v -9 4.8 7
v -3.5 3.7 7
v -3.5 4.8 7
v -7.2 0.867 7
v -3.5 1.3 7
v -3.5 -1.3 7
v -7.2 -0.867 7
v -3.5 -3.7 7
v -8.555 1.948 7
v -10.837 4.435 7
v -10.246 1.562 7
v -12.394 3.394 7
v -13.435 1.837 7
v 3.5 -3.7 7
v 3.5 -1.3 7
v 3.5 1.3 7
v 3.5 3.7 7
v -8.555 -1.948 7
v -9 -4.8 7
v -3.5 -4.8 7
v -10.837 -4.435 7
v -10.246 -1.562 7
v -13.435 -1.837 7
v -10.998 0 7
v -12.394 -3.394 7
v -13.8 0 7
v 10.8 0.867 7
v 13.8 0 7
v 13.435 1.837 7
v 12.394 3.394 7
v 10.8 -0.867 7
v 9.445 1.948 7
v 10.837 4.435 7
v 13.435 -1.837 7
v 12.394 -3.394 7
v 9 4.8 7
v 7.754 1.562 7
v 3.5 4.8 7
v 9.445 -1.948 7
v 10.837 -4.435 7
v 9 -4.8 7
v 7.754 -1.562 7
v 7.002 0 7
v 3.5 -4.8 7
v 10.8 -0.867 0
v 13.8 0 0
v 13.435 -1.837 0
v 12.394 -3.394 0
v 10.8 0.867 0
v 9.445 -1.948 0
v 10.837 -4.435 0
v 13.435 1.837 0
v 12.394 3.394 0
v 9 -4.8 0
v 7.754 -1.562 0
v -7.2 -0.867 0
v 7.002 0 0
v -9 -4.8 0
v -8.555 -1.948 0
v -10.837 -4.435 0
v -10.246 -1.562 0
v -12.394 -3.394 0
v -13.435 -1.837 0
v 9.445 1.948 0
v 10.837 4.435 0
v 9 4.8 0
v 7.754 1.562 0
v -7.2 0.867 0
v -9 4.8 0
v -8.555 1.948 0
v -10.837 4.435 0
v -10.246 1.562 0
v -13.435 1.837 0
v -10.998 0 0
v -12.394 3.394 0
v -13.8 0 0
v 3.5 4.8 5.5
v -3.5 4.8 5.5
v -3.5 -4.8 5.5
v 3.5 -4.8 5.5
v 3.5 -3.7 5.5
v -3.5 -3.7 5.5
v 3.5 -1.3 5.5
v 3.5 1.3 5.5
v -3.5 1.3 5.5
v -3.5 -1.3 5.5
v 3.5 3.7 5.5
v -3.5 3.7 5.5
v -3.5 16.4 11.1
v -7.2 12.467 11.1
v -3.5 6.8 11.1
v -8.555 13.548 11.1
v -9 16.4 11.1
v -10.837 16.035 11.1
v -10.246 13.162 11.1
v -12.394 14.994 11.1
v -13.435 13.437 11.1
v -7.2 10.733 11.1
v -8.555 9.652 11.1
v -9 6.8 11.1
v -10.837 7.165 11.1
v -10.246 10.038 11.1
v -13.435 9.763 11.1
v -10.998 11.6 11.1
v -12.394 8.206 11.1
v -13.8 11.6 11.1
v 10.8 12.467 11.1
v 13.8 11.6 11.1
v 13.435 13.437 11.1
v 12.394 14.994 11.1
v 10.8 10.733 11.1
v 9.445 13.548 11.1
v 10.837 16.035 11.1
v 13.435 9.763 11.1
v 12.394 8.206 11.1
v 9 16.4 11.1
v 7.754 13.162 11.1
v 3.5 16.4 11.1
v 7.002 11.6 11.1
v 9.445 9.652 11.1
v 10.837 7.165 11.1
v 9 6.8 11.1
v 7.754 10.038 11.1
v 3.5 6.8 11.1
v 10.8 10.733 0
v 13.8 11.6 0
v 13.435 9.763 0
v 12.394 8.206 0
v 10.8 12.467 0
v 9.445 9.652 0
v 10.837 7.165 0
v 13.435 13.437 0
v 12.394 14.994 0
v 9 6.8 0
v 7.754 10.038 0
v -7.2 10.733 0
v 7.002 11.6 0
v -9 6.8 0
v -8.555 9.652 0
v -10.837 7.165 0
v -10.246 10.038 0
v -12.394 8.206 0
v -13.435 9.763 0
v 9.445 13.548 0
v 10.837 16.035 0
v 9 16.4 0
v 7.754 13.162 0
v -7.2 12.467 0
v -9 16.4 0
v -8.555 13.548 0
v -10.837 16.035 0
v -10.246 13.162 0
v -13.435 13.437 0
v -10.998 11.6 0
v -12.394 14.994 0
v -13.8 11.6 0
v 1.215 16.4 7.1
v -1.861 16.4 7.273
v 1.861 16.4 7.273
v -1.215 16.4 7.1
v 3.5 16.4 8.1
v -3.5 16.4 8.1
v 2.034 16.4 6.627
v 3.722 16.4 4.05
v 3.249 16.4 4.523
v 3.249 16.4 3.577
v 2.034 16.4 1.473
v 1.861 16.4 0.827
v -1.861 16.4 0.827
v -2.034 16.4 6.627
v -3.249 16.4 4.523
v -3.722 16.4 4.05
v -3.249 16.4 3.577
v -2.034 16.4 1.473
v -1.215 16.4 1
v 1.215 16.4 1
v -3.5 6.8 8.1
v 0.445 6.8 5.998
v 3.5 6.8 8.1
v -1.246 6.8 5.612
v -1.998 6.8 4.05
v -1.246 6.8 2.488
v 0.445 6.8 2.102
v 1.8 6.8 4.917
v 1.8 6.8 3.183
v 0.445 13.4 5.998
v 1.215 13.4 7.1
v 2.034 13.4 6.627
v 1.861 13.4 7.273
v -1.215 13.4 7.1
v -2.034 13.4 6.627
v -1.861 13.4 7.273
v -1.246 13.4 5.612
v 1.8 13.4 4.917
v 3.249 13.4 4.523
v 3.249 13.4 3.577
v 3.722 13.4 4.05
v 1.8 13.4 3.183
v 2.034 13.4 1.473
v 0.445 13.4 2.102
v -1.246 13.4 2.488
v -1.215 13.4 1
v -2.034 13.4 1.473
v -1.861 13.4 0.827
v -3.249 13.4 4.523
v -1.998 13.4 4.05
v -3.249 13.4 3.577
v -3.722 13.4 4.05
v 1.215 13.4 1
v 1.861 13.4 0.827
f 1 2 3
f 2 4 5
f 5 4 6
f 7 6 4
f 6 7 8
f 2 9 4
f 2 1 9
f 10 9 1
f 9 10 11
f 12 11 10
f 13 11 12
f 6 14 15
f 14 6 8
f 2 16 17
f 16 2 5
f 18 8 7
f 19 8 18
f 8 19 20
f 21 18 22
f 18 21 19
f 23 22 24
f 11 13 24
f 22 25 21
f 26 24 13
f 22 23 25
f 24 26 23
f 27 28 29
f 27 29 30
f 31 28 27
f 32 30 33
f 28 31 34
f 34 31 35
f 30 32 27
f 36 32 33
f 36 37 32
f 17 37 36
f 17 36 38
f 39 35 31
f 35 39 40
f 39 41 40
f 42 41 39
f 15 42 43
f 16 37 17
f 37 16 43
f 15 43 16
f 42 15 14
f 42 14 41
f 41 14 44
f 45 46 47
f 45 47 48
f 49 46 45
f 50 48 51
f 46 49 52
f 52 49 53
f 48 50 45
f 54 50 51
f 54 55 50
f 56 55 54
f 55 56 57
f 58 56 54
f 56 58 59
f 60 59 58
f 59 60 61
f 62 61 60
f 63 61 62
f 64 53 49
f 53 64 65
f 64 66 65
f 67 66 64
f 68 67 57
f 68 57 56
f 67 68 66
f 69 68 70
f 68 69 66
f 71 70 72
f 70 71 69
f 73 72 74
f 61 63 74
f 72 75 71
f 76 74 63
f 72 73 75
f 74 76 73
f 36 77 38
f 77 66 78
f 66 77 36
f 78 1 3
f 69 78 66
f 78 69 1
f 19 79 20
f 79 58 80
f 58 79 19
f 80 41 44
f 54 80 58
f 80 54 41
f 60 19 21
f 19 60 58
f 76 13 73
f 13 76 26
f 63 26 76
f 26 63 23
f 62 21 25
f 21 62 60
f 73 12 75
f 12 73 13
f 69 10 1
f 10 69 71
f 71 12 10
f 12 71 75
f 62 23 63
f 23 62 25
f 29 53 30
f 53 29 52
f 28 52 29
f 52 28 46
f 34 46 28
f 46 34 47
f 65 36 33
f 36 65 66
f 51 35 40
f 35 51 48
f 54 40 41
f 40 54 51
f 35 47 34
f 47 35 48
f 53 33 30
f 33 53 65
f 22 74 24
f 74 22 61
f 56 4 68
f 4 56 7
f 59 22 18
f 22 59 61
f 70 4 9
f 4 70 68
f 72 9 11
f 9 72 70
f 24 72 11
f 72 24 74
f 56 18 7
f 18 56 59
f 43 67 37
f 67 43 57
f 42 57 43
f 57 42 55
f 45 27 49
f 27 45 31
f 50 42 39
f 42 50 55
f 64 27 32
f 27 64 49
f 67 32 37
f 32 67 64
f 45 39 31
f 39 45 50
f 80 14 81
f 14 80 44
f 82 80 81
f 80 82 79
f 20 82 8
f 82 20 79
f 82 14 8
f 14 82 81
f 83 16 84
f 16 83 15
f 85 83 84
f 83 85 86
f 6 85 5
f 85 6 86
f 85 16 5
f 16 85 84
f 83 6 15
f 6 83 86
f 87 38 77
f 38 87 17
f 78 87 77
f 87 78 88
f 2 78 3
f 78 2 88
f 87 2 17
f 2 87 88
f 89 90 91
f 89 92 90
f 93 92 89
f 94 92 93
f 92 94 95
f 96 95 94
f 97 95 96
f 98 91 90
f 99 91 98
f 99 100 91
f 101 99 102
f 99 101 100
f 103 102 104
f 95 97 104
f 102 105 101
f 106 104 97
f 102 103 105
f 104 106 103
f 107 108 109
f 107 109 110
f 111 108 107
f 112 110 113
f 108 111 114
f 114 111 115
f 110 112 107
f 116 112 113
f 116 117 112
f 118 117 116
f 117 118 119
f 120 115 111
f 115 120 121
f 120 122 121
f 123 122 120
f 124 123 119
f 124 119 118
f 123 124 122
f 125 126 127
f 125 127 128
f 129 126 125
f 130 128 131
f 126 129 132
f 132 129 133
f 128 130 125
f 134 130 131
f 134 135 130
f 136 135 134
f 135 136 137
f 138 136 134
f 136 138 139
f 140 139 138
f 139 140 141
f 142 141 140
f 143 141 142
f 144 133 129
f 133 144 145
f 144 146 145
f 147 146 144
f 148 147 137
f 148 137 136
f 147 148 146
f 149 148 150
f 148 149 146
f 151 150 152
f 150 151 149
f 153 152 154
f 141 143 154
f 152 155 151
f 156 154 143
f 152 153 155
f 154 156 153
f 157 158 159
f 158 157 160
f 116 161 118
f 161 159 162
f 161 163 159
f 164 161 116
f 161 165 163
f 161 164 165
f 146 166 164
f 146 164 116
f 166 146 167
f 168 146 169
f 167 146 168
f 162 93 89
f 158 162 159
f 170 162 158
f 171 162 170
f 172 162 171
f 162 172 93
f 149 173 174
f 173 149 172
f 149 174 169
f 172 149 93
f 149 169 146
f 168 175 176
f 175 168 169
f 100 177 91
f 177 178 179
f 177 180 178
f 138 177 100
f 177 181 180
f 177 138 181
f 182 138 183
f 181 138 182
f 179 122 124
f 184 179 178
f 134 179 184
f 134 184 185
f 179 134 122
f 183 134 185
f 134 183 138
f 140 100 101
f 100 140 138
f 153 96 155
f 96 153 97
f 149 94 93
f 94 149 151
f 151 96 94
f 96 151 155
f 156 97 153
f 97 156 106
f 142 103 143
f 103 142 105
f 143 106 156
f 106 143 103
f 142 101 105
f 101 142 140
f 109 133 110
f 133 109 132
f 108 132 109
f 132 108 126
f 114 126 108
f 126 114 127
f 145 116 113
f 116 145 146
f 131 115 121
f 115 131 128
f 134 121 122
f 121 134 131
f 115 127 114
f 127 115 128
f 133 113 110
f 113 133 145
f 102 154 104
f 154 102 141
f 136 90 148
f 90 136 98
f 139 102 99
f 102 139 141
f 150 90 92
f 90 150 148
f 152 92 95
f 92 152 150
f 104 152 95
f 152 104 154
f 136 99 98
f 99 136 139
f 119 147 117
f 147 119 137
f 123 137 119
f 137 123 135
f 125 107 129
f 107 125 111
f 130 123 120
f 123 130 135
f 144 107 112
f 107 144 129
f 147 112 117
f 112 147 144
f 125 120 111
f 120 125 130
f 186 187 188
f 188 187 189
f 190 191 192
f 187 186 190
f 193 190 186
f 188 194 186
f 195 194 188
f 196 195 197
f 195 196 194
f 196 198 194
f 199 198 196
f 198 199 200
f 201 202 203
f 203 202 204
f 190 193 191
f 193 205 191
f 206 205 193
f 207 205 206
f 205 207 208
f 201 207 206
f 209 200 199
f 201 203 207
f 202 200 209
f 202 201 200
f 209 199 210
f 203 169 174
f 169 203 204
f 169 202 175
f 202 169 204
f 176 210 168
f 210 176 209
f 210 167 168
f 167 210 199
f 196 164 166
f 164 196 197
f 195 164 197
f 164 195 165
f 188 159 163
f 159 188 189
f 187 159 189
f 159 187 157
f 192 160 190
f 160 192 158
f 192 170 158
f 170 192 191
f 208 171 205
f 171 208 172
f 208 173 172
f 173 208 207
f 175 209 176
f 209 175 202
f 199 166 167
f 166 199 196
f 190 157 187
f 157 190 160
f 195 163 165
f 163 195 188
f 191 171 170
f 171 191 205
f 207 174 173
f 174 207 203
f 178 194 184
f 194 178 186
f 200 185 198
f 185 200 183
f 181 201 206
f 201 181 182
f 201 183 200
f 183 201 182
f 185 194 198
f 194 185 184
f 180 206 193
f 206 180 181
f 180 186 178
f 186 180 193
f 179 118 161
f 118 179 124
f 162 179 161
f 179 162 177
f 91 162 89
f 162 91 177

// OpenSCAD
// file: functions.scad
// PRUSA Mendel  
// Functions used in many files
// GNU GPL v2
// Josef Průša
// josefprusa@me.com
// prusadjs.cz
// http://www.reprap.org/wiki/Prusa_Mendel
// http://github.com/prusajr/PrusaMendel

module nut(d,h,horizontal=true){
cornerdiameter =  (d / 2) / cos (180 / 6);
cylinder(h = h, r = cornerdiameter, $fn = 6);
if(horizontal){
for(i = [1:6]){
	rotate([0,0,60*i]) translate([-cornerdiameter-0.2,0,0]) rotate([0,0,-45]) cube(size = [2,2,h]);
}}
}

// By nophead
module polyhole(d,h) {
    n = max(round(2 * d),3);
    rotate([0,0,180])
        cylinder(h = h, r = (d / 2) / cos (180 / n), $fn = n);
}




module roundcorner(diameter){
	difference(){
		cube(size = [diameter,diameter,99], center = false);
		translate(v = [diameter, diameter, 0]) cylinder(h = 100, r=diameter, center=true);
	}
}
// file: metric.scad
// PRUSA Mendel  
// Default metric sizes
// GNU GPL v2
// Josef Průša
// josefprusa@me.com
// prusadjs.cz
// http://www.reprap.org/wiki/Prusa_Mendel
// http://github.com/prusajr/PrusaMendel

// DONT CHANGE THIS FILE! ALTER VALUES IN CONFIGURATION.SCAD INSTEAD

// RODS

threaded_rod_diameter = 8.2;
threaded_rod_diameter_horizontal = 8.2;
smooth_bar_diameter = 8;
smooth_bar_diameter_horizontal = 8.5;

// Nuts and bolts

m8_diameter = 9;
m8_nut_diameter = 16.4;

m4_diameter = 4.5;
m4_nut_diameter = 9;

m3_diameter = 3.6;
m3_nut_diameter = 6.1;

// Bushing holder

bushing_core_diameter = smooth_bar_diameter;
bushing_material_thickness = 1;

// Motors

motor_shaft = 5.5;
// file: configuration.scad
// PRUSA Mendel  
// Configuration file
// GNU GPL v2
// Josef Průša
// josefprusa@me.com
// prusadjs.cz
// http://www.reprap.org/wiki/Prusa_Mendel
// http://github.com/prusajr/PrusaMendel

// PLEASE SELECT ONE OF THE CONFIGURATIONS BELOW
// BY UN-COMMENTING IT

// Uncomment for metric settings
// METRIC METRIC METRIC METRIC METRIC METRIC METRIC METRIC 

include <metric.scad>;

// Uncomment for imperial settings
// IMPERIAL IMPERIAL IMPERIAL IMPERIAL IMPERIAL IMPERIAL IMPERIAL 

//include <sae.scad>;

// CUSTOM CUSTOM CUSTOM CUSTOM CUSTOM CUSTOM CUSTOM CUSTOM CUSTOM

// Thin walls
layer_height = 0.3;
wot = 1.5;
filament_width = layer_height*wot;

thin_wall = 4*layer_height*wot;

// LM8UU
linear = true;

//608 bearing
bearing_diameter = 22.6;
bearing_thickness = 7;

//Timing belt
belt_pitch = 5;

// CHANGE ONLY THE STUFF YOU KNOW
// IT WILL REPLACE DEFAULT SETTING

// RODS

// threaded_rod_diameter = 0;
// threaded_rod_diameter_horizontal = 0;
// smooth_bar_díameter = 0;
// smooth_bar_díameter_horizontal = 0;

// Nuts and bolts

// m8_diameter = 0;
// m8_nut_diameter = 0;
// m8_nut_thickness = 0;

// m4_diameter = 0;
 m4_nut_diameter = 8.5;
// m4_nut_thickness = 0;

// m3_diameter = 0;
// m3_nut_diameter = 0;
m3_nut_thickness = 3;

// Bushing holder

// bushing_core_diameter = smooth_bar_díameter;
// bushing_material_thickness = 0;


///counted stuff
m3_nut_diameter_bigger = ((m3_nut_diameter  / 2) / cos (180 / 6))*2;

// functions 
include <functions.scad>
// main file
// PRUSA Mendel  
// Belt clamp
// GNU GPL v2
// Josef Průša
// josefprusa@me.com
// prusadjs.cz
// http://www.reprap.org/wiki/Prusa_Mendel
// http://github.com/prusajr/PrusaMendel

include <configuration.scad>

/**
 * @id belt-clamp
 * @name Belt clamp
 * @category Printed
 */ 

hole_spacing = 18;
hole_padding = 3;

belt_notch_width = 7;
belt_notch_length = belt_pitch/2+0.1;
belt_notch_depth = 1.5;

clamp_height = 7;
tensioner_height=m3_nut_diameter+2+2*belt_notch_depth;
width = 2*hole_padding + hole_spacing + m3_diameter ;
depth = m3_diameter + 2* hole_padding;

notches = ceil(depth/belt_pitch)/2;

module beltclamp(){
	difference(){

		
		body (clamp_height);

		//Belt notches
		translate(v = [0,0,clamp_height ]){
			for ( i = [-notches:notches]) {
				translate(v = [0,i*belt_pitch,0])cube(size = [belt_notch_width, belt_notch_length, 2*belt_notch_depth], center = true);
			}
		}
	}
}

module body (hght) {
	difference(){	
		//Clamp body
		union(){
			translate(v = [0,0,hght/2]) cube([hole_spacing, depth, hght], center=true);
			translate(v = [-hole_spacing/2, 0, 0]) cylinder(r=depth/2,h=hght);
			translate(v = [hole_spacing/2, 0, 0]) cylinder(r=depth/2,h=hght);
		}

		//Holes
		translate(v = [-hole_spacing/2, 0, -1])polyhole(m3_diameter, hght+2);
		translate(v = [hole_spacing/2, 0, -1]) polyhole(m3_diameter, hght+2);
	}
}

module belt_tensioner(hght){
	difference() {
		body (hght);

		translate([0,depth/2+1,m3_nut_diameter/2+1]) rotate([90,0,0]) nut(m3_nut_diameter,m3_nut_thickness+1);
		translate([0,depth/2+1,m3_nut_diameter/2+1]) rotate([90,0,0]) polyhole(m3_diameter, depth+2);
	
		translate([0,0,hght/2+m3_nut_diameter/2+2]) cube([belt_notch_width,depth+2,hght-m3_nut_diameter-2+2],center=true);
	}
}
	

beltclamp();

translate([0,depth+2,0]) 
belt_tensioner(tensioner_height);
